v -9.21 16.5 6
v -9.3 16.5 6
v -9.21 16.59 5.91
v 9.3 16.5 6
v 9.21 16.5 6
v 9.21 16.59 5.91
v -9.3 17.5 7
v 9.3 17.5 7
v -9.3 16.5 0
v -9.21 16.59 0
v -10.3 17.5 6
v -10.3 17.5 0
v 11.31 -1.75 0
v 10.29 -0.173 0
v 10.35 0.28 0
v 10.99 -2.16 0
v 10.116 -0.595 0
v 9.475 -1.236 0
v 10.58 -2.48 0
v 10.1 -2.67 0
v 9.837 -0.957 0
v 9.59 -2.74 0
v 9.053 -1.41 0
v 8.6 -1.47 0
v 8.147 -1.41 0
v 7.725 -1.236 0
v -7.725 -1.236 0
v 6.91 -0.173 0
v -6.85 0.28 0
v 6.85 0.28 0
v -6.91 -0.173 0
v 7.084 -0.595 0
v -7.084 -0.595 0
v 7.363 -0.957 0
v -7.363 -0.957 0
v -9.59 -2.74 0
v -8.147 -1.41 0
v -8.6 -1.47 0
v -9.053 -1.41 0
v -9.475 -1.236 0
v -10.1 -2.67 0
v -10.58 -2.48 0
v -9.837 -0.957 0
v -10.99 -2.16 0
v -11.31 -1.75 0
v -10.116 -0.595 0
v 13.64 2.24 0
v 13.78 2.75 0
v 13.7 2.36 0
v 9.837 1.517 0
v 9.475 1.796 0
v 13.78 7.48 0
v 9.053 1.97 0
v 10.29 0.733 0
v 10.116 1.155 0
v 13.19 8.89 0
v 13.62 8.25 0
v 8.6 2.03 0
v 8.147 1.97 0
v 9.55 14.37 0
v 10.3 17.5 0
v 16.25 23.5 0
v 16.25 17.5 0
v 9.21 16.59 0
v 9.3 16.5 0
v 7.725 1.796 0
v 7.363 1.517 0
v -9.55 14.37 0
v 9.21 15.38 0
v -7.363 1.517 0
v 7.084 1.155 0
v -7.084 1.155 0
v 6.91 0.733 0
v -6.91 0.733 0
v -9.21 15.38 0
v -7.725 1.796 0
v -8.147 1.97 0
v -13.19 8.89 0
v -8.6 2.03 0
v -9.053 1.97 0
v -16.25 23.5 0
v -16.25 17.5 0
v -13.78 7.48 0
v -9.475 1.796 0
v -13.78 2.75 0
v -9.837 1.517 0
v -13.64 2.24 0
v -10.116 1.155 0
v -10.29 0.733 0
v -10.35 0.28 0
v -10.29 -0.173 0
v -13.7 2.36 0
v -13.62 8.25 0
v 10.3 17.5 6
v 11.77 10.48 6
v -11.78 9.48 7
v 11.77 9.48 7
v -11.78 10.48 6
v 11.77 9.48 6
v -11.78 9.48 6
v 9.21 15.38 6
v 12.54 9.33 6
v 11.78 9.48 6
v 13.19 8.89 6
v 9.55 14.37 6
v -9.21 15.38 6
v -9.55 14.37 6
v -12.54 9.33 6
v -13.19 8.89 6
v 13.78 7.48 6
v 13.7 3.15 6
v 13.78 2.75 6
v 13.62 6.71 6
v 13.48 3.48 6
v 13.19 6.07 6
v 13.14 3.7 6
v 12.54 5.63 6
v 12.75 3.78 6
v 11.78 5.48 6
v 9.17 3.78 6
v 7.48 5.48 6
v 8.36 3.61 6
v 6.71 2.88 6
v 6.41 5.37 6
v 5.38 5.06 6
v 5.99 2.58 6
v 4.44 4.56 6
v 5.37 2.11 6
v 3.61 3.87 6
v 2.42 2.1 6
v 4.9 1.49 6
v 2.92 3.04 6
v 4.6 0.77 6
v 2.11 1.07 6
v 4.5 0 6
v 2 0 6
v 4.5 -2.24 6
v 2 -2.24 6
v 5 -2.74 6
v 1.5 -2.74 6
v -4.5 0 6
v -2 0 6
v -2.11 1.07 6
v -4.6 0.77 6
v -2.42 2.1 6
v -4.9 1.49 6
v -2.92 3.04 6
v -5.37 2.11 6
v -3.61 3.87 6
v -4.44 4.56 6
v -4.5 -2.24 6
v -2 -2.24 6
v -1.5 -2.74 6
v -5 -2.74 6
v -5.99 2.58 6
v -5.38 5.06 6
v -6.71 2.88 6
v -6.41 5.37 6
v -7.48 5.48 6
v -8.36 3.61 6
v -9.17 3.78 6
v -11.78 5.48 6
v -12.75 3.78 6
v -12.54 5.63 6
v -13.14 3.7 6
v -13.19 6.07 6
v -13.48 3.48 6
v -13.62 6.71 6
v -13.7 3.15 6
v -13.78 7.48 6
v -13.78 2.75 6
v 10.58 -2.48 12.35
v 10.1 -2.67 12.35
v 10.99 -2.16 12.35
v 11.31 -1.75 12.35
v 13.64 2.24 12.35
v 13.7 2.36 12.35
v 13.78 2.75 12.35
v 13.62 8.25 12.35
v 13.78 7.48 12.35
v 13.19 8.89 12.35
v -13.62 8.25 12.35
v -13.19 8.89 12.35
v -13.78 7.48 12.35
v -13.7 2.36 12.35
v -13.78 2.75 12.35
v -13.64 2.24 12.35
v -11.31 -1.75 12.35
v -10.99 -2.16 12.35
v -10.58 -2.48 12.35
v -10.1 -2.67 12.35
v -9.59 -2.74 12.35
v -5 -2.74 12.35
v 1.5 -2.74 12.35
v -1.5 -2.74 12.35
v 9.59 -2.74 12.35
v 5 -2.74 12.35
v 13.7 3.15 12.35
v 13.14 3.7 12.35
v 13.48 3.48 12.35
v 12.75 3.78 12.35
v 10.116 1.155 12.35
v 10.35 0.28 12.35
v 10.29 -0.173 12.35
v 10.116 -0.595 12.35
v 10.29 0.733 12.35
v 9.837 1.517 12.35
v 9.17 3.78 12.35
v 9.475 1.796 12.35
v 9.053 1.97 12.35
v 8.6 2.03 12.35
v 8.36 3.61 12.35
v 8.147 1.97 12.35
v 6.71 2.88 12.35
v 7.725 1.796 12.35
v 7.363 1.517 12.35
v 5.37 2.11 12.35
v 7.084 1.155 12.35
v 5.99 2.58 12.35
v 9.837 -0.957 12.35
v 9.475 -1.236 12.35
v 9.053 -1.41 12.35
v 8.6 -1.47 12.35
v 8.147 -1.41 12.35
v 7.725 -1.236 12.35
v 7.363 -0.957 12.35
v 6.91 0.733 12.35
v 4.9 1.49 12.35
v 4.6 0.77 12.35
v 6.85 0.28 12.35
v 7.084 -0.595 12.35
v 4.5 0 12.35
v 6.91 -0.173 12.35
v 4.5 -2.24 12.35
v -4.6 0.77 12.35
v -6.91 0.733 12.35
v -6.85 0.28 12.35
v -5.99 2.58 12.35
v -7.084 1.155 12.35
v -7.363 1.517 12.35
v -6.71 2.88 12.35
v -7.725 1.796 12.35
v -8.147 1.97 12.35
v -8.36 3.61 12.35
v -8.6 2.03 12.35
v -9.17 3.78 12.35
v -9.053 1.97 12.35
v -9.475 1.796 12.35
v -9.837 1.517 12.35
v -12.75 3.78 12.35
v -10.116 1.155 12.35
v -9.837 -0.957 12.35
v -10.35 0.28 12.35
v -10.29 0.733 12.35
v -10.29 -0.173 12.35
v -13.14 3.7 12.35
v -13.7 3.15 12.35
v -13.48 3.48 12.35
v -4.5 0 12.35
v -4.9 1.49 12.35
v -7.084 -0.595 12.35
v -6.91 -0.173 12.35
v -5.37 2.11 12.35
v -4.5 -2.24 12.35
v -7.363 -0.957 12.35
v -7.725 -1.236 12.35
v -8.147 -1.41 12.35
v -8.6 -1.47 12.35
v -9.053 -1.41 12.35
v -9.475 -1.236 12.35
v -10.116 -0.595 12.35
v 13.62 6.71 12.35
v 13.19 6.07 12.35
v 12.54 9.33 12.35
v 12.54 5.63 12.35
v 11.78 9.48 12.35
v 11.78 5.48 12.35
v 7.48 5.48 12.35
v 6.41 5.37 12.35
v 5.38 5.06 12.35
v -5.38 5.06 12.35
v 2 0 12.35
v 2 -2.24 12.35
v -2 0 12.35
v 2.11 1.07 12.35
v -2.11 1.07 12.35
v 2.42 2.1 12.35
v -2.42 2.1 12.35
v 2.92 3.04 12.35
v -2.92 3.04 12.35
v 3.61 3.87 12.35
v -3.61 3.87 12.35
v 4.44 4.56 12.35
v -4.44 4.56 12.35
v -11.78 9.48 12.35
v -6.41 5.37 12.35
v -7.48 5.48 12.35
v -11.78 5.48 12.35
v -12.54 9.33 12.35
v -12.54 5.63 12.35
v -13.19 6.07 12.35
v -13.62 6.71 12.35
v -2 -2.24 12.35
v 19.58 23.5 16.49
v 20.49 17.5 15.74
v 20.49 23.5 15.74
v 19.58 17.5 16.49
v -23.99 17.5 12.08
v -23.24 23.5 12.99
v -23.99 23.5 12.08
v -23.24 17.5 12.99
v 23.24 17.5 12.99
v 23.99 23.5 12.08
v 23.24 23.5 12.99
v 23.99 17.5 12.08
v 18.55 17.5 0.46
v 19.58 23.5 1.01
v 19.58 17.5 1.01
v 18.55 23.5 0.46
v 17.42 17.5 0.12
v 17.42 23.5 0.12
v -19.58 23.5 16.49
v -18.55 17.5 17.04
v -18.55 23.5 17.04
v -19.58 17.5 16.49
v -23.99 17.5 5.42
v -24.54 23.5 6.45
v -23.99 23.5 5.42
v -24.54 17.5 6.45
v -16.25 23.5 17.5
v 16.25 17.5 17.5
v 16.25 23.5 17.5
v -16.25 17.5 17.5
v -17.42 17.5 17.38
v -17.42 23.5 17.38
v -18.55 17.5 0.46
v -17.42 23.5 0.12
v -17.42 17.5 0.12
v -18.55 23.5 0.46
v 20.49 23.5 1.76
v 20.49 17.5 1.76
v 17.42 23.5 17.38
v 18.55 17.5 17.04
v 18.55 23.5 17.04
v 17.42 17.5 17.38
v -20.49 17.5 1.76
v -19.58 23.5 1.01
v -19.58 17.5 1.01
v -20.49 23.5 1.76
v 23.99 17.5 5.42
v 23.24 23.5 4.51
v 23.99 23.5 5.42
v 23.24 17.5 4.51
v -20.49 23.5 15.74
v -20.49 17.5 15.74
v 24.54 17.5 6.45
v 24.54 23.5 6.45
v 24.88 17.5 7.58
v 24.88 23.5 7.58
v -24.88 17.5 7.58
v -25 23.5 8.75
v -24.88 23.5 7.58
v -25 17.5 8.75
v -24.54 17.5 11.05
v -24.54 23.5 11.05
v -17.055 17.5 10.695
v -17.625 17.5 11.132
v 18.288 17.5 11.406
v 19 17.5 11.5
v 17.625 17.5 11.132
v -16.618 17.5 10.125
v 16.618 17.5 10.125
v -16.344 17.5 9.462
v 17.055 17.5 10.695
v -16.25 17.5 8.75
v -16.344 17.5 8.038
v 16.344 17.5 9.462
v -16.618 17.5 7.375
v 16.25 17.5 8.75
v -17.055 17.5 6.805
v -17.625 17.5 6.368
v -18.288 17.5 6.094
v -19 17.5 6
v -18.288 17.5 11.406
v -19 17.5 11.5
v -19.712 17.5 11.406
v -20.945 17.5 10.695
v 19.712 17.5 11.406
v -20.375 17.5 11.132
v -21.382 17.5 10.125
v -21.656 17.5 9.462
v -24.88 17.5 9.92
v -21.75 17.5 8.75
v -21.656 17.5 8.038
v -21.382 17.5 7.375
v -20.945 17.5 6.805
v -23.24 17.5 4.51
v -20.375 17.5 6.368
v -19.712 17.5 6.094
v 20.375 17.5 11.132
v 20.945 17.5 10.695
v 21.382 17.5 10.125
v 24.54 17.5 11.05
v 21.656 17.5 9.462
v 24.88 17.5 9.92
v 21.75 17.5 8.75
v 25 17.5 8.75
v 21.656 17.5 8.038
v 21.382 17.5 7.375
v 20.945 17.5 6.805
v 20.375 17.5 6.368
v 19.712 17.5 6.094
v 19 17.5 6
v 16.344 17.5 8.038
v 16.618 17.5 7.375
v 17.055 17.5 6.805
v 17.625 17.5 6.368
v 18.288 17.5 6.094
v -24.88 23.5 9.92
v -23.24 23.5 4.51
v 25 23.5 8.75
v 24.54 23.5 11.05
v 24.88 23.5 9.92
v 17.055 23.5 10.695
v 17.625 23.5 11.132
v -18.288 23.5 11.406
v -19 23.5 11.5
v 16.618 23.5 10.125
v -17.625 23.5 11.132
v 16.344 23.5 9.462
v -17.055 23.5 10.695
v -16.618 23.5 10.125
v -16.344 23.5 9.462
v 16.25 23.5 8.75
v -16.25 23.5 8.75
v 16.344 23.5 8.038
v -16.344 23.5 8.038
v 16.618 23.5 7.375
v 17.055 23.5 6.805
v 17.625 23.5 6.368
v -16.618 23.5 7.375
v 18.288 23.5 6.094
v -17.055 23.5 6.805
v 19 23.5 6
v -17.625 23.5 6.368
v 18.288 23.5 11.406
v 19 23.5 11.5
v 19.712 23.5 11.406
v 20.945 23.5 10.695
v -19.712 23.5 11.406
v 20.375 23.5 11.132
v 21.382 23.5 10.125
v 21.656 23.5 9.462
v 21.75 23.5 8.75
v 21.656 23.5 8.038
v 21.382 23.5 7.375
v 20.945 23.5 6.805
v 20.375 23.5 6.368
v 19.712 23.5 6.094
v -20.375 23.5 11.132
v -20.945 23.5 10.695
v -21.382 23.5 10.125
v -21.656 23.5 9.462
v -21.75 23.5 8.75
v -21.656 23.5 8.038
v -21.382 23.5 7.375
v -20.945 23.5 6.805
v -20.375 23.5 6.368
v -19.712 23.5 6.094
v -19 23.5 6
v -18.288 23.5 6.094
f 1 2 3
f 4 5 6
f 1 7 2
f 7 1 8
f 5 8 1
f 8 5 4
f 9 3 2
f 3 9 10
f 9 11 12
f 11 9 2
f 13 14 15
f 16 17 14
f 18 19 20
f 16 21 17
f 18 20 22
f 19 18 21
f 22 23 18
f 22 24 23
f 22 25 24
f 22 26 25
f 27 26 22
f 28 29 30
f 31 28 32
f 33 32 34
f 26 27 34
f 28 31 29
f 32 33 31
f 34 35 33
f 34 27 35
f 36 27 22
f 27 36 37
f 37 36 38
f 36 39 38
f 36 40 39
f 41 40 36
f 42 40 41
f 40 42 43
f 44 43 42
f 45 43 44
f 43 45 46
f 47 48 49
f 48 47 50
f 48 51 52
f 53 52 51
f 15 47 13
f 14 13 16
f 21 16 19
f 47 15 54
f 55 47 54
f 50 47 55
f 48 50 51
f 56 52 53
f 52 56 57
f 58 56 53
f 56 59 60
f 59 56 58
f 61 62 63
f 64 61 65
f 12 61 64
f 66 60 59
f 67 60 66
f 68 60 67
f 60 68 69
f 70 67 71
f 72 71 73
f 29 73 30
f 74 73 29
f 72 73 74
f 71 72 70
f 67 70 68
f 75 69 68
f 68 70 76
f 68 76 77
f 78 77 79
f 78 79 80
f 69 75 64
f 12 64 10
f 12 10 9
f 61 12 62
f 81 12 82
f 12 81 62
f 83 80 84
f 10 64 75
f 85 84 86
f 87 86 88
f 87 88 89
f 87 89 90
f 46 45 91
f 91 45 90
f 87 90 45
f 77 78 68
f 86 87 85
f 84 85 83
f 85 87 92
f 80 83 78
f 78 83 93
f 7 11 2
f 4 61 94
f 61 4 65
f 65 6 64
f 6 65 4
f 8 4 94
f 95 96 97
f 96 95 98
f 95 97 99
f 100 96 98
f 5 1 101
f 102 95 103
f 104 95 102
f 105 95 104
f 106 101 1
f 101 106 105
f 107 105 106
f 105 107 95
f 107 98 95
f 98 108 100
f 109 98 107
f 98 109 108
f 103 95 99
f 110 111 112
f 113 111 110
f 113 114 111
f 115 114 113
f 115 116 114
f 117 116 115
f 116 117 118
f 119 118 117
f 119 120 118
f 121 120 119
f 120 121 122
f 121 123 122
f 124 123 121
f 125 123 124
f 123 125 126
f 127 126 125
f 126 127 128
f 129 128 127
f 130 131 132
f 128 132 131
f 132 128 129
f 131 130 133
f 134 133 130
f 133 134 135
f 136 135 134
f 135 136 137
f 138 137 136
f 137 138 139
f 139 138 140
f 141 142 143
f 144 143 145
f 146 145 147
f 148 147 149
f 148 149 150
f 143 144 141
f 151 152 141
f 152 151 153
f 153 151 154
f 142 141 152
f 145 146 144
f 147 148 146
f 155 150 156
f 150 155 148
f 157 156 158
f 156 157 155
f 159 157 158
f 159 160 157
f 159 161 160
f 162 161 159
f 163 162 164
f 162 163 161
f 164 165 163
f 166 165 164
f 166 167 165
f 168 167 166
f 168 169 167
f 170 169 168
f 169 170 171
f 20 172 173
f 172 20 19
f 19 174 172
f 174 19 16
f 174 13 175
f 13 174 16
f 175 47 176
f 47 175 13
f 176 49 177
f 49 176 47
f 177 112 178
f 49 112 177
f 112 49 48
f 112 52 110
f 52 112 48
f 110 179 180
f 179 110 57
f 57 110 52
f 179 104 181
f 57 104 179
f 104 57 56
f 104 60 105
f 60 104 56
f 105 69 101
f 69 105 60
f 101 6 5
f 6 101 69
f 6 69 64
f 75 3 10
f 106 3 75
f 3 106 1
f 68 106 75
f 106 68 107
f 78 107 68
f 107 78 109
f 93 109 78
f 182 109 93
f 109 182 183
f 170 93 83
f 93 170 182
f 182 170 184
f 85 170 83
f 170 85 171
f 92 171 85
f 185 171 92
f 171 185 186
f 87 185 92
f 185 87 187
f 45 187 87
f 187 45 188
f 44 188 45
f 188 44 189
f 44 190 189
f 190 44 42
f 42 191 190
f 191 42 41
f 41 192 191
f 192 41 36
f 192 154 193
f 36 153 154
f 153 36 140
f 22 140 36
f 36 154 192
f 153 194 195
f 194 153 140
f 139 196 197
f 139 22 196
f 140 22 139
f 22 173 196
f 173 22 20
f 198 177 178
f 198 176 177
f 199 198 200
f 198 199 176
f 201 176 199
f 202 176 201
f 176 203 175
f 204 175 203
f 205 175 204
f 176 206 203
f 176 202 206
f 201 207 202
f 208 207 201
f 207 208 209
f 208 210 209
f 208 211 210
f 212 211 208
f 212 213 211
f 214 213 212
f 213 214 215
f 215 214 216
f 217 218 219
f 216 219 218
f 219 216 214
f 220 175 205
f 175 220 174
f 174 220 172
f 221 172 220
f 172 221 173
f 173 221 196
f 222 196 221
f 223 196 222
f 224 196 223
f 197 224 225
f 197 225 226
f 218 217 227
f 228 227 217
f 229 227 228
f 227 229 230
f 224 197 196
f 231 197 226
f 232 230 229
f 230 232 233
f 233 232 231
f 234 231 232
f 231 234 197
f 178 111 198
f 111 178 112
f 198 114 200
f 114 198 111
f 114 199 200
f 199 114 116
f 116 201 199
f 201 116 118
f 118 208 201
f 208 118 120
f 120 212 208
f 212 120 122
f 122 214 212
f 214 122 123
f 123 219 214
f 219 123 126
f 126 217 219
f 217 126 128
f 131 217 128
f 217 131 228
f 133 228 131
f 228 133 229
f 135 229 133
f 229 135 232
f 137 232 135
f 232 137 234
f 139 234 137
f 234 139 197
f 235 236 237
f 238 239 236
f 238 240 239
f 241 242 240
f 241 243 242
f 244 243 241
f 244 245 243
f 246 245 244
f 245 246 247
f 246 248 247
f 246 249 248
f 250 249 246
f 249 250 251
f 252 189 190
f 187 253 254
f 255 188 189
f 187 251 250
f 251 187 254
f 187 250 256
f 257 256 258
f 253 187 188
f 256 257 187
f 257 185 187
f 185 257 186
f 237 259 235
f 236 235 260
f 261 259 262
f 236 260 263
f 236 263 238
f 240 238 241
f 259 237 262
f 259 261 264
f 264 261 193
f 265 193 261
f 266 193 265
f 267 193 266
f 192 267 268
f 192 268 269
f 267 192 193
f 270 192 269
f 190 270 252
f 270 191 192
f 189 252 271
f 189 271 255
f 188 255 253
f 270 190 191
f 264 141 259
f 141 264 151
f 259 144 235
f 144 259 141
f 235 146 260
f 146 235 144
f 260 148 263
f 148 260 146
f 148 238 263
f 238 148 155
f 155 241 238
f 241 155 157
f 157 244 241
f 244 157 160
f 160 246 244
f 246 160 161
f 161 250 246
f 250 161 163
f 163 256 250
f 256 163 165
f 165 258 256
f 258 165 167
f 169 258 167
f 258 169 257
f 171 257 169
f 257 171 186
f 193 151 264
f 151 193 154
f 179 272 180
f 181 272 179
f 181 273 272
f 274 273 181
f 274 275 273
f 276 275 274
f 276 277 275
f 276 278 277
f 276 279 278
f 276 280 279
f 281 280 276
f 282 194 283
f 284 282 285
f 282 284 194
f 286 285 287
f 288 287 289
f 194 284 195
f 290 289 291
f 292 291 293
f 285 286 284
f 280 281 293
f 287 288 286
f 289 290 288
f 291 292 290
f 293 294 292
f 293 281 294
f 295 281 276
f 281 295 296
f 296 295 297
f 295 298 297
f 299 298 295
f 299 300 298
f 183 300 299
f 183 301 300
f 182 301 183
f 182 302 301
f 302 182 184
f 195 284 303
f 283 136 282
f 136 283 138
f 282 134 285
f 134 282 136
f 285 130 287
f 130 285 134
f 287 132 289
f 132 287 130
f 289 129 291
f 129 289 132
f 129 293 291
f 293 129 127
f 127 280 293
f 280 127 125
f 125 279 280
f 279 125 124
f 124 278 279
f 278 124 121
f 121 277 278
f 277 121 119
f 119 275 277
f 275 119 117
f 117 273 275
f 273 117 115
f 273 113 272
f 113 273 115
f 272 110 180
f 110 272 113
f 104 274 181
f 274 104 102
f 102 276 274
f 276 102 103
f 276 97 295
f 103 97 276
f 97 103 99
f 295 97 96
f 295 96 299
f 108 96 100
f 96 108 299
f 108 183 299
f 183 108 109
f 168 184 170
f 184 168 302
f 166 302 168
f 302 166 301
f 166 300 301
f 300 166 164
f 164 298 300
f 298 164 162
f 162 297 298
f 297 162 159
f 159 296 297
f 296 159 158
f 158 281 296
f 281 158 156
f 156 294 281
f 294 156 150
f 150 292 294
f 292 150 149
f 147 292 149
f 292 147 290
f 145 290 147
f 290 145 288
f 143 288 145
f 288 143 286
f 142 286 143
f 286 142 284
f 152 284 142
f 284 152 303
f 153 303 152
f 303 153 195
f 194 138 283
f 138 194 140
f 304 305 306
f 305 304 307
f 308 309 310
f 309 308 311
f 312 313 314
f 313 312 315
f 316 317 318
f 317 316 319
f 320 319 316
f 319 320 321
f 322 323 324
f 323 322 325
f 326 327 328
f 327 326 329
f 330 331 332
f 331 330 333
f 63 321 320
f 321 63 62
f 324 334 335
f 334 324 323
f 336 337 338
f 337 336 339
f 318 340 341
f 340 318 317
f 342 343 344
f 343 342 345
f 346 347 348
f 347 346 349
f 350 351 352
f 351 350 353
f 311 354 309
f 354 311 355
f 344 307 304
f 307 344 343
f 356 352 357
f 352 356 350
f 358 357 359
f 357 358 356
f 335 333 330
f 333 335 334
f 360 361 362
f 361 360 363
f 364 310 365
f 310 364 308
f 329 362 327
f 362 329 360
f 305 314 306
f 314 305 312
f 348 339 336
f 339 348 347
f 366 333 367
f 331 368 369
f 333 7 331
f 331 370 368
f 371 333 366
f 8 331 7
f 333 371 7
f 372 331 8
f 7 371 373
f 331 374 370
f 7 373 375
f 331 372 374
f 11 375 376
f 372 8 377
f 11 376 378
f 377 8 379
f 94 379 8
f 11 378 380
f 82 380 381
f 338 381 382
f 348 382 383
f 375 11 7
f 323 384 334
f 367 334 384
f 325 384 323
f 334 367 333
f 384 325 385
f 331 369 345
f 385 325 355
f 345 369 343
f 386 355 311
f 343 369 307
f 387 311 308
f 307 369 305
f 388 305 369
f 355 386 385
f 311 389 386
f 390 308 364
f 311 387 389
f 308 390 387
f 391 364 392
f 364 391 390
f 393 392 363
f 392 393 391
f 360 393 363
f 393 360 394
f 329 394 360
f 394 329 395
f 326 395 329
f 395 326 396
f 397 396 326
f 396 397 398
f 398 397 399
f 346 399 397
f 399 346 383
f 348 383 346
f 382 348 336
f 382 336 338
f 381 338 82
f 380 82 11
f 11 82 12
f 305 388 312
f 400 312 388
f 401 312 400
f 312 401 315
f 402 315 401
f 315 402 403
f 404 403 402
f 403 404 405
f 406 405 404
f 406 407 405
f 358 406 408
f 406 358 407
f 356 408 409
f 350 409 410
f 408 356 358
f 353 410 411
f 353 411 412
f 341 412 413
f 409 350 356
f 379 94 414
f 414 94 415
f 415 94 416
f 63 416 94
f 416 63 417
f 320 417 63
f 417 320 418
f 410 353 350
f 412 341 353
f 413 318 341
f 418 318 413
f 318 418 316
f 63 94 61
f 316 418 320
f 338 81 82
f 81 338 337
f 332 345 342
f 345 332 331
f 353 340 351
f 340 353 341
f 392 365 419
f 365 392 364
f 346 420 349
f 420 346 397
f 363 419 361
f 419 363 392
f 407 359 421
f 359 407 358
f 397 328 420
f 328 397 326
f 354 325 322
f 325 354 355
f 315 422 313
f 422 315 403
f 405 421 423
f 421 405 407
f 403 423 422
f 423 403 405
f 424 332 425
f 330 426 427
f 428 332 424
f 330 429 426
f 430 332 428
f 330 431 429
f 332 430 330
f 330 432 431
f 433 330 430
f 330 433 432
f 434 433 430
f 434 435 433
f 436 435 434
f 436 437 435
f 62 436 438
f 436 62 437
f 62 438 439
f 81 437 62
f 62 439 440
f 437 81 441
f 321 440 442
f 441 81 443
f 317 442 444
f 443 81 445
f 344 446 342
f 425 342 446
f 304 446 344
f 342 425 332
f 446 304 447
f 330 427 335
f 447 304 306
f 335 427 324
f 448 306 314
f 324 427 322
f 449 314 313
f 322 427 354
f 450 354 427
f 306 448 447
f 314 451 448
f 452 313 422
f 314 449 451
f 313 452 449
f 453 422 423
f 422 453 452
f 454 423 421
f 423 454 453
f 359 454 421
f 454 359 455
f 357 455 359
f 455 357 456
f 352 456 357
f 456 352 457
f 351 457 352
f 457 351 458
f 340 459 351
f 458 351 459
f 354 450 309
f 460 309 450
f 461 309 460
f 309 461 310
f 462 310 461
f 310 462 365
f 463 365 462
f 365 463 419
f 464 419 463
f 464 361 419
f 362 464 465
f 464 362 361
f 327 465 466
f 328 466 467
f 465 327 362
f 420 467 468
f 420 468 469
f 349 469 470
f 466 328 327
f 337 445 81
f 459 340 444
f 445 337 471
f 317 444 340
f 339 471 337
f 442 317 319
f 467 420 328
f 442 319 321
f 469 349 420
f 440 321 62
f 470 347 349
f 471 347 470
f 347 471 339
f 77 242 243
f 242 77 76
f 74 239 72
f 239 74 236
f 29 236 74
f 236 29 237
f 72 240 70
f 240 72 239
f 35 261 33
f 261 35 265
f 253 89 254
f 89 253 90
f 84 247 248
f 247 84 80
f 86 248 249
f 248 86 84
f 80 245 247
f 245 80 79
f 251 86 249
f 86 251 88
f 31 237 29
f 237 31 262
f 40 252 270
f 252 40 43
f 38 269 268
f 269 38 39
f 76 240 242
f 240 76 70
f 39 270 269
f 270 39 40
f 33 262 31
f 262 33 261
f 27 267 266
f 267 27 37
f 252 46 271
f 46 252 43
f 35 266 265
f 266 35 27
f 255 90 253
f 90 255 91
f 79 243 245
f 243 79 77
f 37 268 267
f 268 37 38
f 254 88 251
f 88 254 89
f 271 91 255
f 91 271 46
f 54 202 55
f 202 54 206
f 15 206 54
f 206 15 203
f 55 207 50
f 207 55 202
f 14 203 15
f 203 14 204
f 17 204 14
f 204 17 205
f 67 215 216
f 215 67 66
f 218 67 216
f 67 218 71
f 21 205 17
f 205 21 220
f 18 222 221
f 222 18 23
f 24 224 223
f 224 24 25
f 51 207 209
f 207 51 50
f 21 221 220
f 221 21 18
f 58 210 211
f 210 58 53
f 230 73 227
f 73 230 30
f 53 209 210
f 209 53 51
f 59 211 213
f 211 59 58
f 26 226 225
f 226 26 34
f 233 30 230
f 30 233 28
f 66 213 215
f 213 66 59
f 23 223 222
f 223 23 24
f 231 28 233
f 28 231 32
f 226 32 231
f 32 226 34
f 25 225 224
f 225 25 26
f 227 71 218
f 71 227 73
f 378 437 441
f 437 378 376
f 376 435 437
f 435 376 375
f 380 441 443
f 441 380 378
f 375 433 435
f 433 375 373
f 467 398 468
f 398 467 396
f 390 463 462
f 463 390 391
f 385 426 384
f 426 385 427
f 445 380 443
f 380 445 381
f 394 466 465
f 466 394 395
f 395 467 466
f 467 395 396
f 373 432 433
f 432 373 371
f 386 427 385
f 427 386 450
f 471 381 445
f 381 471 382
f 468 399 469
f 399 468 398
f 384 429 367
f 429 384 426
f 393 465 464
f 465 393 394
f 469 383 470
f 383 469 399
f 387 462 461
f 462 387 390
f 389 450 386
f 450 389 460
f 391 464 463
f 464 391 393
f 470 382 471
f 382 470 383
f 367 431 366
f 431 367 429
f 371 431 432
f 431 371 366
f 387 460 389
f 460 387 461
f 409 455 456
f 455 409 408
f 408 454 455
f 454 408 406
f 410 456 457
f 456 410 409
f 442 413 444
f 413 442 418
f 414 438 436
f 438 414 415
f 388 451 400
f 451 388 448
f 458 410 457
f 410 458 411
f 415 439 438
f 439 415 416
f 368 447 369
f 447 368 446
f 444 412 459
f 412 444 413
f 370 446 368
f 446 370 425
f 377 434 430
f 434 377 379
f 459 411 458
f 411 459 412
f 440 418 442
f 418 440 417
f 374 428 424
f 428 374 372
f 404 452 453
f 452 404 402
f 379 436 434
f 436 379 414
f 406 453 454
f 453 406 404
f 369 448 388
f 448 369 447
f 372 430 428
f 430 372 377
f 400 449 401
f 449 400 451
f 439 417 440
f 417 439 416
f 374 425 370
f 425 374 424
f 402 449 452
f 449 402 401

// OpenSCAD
//Belt Clamp to secure y-axis belt to bottom of Plastic Y-Carriage Plates
//I used the belt clamping idea from:
//http://www.thingiverse.com/thing:643799 to create this
Ht = 6.36;
Bht=6;
M3=3.5;
M5=5.5;
M5Head=9;           //Diameter to cut for M5 bolt head
$fn=24;
module Base()
{
    linear_extrude(height = Bht, center = false, convexity = 10)polygon(points = 
    [[-9.59,-2.74],[9.59,-2.74],[10.1,-2.67],
    [10.58,-2.48],[10.99,-2.16],[11.31,-1.75],
    [13.64,2.24],[13.7,2.36],[13.78,2.75],
    [13.78,7.48],[13.62,8.25],[13.19,8.89],
    [9.55,14.37],[9.21,15.38],[9.21,18.98],
    [-9.21,18.98],[-9.21,15.38],[-9.55,14.37],
    [-13.19,8.89],[-13.62,8.25],[-13.78,7.48],
    [-13.78,2.75],[-13.7,2.36],[-13.64,2.24],
    [-11.31,-1.75],[-10.99,-2.16],[-10.58,-2.48],
    [-10.1,-2.67]]);
}
module DrawFillets()
{
//Fillet on top of base that connects to Vertical Base
    translate([-9.3,17.5,Bht])
    rotate([0,90,0])
    cylinder(d=2,h=18.6,$fn=4);
//Fillet on left of base that connects to Vertical Base
    translate([-9.3,17.5,0])
    rotate([0,0,0])
    cylinder(d=2,h=Bht,$fn=4);
    translate([-9.3,17.5,Bht])
    rotate([0,0,0])
    cylinder(d1=2,d2=0,h=1,$fn=4);
//Fillet on Right of base that connects to Vertical Base
    translate([9.3,17.5,0])
    rotate([0,0,0])
    cylinder(d=2,h=Bht,$fn=4);
    translate([9.3,17.5,Bht])
    rotate([0,0,0])
    cylinder(d1=2,d2=0,h=1,$fn=4);
//Fillet top Clamp area
    translate([-11.78,9.48,Bht])
    rotate([0,90,0])
    cylinder(d=2,h=23.55,$fn=4);
}
module BaseVert()
{
    linear_extrude(height = Bht, center = false, convexity = 10)polygon(points = 
    [[16.25,0],[17.42,0.12],[18.55,0.46],
    [19.58,1.01],[20.49,1.76],[23.24,4.51],
    [23.99,5.42],[24.54,6.45],[24.88,7.58],
    [25,8.75],[24.88,9.92],[24.54,11.05],
    [23.99,12.08],[23.24,12.99],[20.49,15.74],
    [19.58,16.49],[18.55,17.04],[17.42,17.38],
    [16.25,17.5],[-16.25,17.5],[-17.42,17.38],
    [-18.55,17.04],[-19.58,16.49],[-20.49,15.74],
    [-23.24,12.99],[-23.99,12.08],[-24.54,11.05],
    [-24.88,9.92],[-25,8.75],[-24.88,7.58],
    [-24.54,6.45],[-23.99,5.42],[-23.24,4.51],
    [-20.49,1.76],[-19.58,1.01],[-18.55,0.46],
    [-17.42,0.12],[-16.25,0]]);
}

module Middle()
{
    translate([0,0,Bht-.01])
    linear_extrude(height = Ht, center = false, convexity = 10)polygon(points = 
    [[-11.78,5.48],[-7.48,5.48],[-6.41,5.37],
    [-5.38,5.06],[-4.44,4.56],[-3.61,3.87],
    [-2.92,3.04],[-2.42,2.1],[-2.11,1.07],
    [-2,0],[-2,-2.24],[-1.5,-2.74],
    [1.5,-2.74],[2,-2.24],[2,0],
    [2.11,1.07],[2.42,2.1],[2.92,3.04],
    [3.61,3.87],[4.44,4.56],[5.38,5.06],
    [6.41,5.37],[7.48,5.48],[11.78,5.48],
    [12.54,5.63],[13.19,6.07],[13.62,6.71],
    [13.78,7.48],[13.62,8.25],[13.19,8.89],
    [12.54,9.33],[11.78,9.48],[-11.78,9.48],
    [-12.54,9.33],[-13.19,8.89],[-13.62,8.25],
    [-13.78,7.48],[-13.62,6.71],[-13.19,6.07],
    [-12.54,5.63]]);
}
module Left()
{
    translate([0,0,Bht-.01])
    linear_extrude(height = Ht, center = false, convexity = 10)polygon(points = 
    [[-4.5,0],[-4.6,0.77],[-4.9,1.49],
    [-5.37,2.11],[-5.99,2.58],[-6.71,2.88],
    [-8.36,3.61],[-9.17,3.78],[-12.75,3.78],
    [-13.14,3.7],[-13.48,3.48],[-13.7,3.15],
    [-13.78,2.75],[-13.7,2.36],[-13.64,2.24],
    [-11.31,-1.75],[-10.99,-2.16],[-10.58,-2.48],
    [-10.1,-2.67],[-9.59,-2.74],[-5,-2.74],
    [-4.5,-2.24]]);
}
module Right()
{
    translate([0,0,Bht-.01])
    linear_extrude(height = Ht, center = false, convexity = 10)polygon(points = 
    [[4.5,0],[4.6,0.77],[4.9,1.49],
    [5.37,2.11],[5.99,2.58],[6.71,2.88],
    [8.36,3.61],[9.17,3.78],[12.75,3.78],
    [13.14,3.7],[13.48,3.48],[13.7,3.15],
    [13.78,2.75],[13.7,2.36],[13.64,2.24],
    [11.31,-1.75],[10.99,-2.16],[10.58,-2.48],
    [10.1,-2.67],[9.59,-2.74],[5,-2.74],
    [4.5,-2.24]]);
}
module HolesVert()
{
    translate([-8.6,.28,-1])
    cylinder(d=M3,h=20);
    translate([8.6,.28,-1])
    cylinder(d=M3,h=20);
//Uncomment next 2 lines to add another hole in center of middle, not needed
//    translate([0,5.73,-1])
//    cylinder(d=M3,h=20);
}

module HolesHor()
{
    translate([-19,0,8.75])
    rotate([-90,0,0])
    cylinder(d=M5,h=30);
    translate([19,0,8.75])
    rotate([-90,0,0])
    cylinder(d=M5,h=30);
//Uncomment 6 lines below to Countersink for 16mm length bolts
//You may have to do a little cleanup on the countersink
//    translate([-19,16.5,8.75])
//    rotate([-90,0,0])
//    cylinder(d=M5Head,h=3.5);
//    translate([-19,16.5,8.75])
//    rotate([-90,0,0])
//    cylinder(d=M5Head,h=3.5);
}
module DrawUnion()
{
    union()
    {
        Base();
        Right();
        Left();
        Middle();
        translate([0,6+17.5,0])
        rotate([90,0,0])
        BaseVert();
        DrawFillets();
    }
}
module DrawFinal()
{
difference()
{
    DrawUnion();
//Punch M3 holes for securing Belt
    HolesVert();
//Punch M5 holes for mounting to Y-Bed
    HolesHor();
}
}
DrawFinal();
